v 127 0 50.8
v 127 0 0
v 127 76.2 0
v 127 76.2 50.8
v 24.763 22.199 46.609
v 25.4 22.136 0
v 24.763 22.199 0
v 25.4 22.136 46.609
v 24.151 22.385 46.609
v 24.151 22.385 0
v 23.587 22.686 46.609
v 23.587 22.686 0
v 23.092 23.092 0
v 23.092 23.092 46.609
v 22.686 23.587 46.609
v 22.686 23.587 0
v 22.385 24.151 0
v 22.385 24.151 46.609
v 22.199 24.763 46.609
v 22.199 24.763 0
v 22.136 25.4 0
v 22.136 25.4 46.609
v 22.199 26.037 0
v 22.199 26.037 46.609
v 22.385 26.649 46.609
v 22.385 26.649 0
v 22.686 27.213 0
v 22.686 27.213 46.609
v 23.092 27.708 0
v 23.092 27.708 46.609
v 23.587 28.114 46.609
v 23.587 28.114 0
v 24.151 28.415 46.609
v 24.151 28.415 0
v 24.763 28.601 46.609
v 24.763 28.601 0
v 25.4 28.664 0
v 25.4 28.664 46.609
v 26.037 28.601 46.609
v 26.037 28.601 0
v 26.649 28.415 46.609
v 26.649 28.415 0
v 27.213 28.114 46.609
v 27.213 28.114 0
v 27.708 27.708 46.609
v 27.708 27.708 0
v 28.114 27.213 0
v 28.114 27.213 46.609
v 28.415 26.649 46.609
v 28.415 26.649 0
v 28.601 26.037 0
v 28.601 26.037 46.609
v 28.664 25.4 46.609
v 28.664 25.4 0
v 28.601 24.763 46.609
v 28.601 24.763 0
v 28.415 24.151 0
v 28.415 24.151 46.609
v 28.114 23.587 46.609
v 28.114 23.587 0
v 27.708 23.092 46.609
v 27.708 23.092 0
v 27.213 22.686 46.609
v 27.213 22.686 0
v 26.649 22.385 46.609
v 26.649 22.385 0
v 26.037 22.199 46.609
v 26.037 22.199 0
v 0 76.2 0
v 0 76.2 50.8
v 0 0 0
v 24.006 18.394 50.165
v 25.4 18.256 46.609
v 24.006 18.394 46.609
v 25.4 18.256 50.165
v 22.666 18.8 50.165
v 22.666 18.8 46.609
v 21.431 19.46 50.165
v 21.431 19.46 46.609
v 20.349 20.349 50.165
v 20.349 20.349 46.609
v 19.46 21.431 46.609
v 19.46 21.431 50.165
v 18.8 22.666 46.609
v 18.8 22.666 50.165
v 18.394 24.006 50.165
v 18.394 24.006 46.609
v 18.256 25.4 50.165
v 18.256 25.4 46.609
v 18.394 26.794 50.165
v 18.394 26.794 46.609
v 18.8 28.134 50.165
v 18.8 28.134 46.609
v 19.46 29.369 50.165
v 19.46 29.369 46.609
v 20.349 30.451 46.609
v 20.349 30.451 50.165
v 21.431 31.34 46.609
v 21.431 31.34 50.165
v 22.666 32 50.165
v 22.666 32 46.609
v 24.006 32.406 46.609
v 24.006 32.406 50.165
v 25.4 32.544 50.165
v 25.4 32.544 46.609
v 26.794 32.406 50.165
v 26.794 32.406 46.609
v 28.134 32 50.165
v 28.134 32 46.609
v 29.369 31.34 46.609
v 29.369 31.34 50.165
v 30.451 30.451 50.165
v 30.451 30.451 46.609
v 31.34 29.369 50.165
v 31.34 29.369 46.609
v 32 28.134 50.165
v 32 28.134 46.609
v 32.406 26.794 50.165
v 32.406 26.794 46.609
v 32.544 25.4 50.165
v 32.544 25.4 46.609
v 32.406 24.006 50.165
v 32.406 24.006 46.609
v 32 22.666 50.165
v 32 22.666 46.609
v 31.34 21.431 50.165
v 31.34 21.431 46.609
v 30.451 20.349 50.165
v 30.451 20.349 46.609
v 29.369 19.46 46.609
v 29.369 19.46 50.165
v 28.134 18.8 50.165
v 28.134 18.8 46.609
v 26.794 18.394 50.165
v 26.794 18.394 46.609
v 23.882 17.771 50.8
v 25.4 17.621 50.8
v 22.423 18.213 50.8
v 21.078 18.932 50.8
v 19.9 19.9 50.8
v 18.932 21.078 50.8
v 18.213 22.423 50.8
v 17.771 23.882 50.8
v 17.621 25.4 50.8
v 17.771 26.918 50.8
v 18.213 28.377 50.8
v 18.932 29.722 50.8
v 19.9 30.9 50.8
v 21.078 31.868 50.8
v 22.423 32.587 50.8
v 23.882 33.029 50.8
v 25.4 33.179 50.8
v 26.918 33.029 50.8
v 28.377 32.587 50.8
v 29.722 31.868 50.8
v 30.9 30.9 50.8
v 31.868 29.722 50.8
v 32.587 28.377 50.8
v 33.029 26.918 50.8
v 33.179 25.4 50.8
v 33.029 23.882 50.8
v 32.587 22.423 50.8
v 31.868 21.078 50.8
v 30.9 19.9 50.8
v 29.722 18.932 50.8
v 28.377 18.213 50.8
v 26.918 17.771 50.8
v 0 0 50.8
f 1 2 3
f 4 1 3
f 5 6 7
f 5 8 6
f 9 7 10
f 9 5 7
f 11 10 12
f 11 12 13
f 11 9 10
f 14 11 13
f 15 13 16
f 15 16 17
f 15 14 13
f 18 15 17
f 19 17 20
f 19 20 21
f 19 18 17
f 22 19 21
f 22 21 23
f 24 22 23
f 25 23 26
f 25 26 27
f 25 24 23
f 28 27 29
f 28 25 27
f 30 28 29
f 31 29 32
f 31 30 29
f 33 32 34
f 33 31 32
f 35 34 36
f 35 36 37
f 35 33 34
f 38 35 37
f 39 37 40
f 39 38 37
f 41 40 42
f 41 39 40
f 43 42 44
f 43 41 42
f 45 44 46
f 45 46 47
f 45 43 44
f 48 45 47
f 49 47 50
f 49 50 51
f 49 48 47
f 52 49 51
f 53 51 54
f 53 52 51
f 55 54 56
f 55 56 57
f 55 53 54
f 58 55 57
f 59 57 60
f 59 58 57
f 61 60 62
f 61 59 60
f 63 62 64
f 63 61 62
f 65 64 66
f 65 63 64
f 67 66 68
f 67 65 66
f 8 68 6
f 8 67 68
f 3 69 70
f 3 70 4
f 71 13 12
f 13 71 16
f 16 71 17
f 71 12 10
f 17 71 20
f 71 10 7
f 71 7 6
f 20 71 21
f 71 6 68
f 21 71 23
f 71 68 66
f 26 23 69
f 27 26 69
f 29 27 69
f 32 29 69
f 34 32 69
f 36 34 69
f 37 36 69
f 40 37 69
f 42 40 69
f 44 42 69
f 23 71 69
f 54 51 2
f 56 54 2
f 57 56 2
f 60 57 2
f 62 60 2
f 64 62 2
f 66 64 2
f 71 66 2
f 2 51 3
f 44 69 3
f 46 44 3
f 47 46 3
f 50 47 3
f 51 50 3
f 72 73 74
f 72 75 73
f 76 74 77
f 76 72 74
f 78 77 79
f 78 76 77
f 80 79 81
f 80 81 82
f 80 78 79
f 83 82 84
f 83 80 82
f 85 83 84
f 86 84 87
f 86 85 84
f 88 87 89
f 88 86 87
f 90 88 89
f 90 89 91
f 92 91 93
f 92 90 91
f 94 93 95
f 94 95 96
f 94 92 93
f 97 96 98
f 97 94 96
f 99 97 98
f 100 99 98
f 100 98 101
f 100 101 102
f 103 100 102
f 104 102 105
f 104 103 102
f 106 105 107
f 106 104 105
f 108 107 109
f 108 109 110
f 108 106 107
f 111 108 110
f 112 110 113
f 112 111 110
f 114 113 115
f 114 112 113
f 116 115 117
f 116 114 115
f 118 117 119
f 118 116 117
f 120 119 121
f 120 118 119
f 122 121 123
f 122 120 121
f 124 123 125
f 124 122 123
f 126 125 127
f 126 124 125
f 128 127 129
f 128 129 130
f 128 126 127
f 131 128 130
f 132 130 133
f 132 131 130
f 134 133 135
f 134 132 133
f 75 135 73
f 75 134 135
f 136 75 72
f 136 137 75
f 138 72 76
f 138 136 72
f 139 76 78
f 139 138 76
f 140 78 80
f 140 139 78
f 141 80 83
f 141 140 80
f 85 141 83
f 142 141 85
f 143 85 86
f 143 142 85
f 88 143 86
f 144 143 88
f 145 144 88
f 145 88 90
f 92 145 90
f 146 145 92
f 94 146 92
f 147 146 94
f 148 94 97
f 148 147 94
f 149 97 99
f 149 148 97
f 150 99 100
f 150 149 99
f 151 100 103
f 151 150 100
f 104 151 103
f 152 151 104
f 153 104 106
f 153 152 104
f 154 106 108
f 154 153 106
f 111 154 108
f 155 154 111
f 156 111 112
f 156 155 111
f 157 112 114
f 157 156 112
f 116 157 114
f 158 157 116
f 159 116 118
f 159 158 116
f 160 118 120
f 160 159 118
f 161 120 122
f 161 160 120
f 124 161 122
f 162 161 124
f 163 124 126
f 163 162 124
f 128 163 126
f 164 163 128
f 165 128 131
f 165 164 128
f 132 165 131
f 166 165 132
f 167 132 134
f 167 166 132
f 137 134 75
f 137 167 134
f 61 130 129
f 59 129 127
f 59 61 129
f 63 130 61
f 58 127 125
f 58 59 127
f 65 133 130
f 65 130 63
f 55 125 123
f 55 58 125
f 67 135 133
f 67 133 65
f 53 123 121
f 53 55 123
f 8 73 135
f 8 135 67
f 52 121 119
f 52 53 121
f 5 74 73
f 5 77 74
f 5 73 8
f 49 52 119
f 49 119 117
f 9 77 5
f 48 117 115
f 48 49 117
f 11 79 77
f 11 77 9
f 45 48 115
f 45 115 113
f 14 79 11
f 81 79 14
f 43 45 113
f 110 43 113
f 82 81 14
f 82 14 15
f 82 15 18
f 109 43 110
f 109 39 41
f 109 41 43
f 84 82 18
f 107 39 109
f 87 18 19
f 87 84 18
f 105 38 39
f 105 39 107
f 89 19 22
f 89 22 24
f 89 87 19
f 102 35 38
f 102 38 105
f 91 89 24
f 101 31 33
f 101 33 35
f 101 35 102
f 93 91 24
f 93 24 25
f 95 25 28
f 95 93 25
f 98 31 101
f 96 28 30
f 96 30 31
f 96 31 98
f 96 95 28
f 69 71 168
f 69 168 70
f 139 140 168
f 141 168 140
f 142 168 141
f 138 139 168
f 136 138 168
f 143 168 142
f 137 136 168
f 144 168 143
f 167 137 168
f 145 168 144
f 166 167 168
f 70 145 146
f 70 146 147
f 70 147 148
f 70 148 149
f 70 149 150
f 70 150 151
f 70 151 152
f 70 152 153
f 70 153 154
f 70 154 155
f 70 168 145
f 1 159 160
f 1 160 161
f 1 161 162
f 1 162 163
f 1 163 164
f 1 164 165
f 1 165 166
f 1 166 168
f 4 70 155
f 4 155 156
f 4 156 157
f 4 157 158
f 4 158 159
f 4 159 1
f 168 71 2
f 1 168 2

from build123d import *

# Parameters (mm, degrees)
SKETCH2_W           = 127
SKETCH2_H           = 76.2
BOSS_EXTRUDE1_DEPTH = 50.8


with BuildPart() as part:
    # Sketch2 → Boss-Extrude1 (new body)
    with BuildSketch(Plane.XY):
        with Locations((63.5, 38.1)):
            Rectangle(SKETCH2_W, SKETCH2_H)
    extrude(amount=BOSS_EXTRUDE1_DEPTH)

    # Sketch5 → CBORE for 1/4 Binding Head Machine Screw1 (revolve, cut)
    with BuildSketch(Plane(origin=(25.4, 25.4, 50.8), x_dir=(0, -1, 0), z_dir=(1, 0, 0))):
        Polygon((0, 0), (0, 50.8), (3.2639, 50.8), (3.2639, 4.191), (7.14375, 4.191), (7.14375, 0.635), (7.77875, 0), align=None)
    revolve(axis=Axis((25.4, 25.4, 57.15), (0, 0, -1)), mode=Mode.SUBTRACT)


solid = part.part
